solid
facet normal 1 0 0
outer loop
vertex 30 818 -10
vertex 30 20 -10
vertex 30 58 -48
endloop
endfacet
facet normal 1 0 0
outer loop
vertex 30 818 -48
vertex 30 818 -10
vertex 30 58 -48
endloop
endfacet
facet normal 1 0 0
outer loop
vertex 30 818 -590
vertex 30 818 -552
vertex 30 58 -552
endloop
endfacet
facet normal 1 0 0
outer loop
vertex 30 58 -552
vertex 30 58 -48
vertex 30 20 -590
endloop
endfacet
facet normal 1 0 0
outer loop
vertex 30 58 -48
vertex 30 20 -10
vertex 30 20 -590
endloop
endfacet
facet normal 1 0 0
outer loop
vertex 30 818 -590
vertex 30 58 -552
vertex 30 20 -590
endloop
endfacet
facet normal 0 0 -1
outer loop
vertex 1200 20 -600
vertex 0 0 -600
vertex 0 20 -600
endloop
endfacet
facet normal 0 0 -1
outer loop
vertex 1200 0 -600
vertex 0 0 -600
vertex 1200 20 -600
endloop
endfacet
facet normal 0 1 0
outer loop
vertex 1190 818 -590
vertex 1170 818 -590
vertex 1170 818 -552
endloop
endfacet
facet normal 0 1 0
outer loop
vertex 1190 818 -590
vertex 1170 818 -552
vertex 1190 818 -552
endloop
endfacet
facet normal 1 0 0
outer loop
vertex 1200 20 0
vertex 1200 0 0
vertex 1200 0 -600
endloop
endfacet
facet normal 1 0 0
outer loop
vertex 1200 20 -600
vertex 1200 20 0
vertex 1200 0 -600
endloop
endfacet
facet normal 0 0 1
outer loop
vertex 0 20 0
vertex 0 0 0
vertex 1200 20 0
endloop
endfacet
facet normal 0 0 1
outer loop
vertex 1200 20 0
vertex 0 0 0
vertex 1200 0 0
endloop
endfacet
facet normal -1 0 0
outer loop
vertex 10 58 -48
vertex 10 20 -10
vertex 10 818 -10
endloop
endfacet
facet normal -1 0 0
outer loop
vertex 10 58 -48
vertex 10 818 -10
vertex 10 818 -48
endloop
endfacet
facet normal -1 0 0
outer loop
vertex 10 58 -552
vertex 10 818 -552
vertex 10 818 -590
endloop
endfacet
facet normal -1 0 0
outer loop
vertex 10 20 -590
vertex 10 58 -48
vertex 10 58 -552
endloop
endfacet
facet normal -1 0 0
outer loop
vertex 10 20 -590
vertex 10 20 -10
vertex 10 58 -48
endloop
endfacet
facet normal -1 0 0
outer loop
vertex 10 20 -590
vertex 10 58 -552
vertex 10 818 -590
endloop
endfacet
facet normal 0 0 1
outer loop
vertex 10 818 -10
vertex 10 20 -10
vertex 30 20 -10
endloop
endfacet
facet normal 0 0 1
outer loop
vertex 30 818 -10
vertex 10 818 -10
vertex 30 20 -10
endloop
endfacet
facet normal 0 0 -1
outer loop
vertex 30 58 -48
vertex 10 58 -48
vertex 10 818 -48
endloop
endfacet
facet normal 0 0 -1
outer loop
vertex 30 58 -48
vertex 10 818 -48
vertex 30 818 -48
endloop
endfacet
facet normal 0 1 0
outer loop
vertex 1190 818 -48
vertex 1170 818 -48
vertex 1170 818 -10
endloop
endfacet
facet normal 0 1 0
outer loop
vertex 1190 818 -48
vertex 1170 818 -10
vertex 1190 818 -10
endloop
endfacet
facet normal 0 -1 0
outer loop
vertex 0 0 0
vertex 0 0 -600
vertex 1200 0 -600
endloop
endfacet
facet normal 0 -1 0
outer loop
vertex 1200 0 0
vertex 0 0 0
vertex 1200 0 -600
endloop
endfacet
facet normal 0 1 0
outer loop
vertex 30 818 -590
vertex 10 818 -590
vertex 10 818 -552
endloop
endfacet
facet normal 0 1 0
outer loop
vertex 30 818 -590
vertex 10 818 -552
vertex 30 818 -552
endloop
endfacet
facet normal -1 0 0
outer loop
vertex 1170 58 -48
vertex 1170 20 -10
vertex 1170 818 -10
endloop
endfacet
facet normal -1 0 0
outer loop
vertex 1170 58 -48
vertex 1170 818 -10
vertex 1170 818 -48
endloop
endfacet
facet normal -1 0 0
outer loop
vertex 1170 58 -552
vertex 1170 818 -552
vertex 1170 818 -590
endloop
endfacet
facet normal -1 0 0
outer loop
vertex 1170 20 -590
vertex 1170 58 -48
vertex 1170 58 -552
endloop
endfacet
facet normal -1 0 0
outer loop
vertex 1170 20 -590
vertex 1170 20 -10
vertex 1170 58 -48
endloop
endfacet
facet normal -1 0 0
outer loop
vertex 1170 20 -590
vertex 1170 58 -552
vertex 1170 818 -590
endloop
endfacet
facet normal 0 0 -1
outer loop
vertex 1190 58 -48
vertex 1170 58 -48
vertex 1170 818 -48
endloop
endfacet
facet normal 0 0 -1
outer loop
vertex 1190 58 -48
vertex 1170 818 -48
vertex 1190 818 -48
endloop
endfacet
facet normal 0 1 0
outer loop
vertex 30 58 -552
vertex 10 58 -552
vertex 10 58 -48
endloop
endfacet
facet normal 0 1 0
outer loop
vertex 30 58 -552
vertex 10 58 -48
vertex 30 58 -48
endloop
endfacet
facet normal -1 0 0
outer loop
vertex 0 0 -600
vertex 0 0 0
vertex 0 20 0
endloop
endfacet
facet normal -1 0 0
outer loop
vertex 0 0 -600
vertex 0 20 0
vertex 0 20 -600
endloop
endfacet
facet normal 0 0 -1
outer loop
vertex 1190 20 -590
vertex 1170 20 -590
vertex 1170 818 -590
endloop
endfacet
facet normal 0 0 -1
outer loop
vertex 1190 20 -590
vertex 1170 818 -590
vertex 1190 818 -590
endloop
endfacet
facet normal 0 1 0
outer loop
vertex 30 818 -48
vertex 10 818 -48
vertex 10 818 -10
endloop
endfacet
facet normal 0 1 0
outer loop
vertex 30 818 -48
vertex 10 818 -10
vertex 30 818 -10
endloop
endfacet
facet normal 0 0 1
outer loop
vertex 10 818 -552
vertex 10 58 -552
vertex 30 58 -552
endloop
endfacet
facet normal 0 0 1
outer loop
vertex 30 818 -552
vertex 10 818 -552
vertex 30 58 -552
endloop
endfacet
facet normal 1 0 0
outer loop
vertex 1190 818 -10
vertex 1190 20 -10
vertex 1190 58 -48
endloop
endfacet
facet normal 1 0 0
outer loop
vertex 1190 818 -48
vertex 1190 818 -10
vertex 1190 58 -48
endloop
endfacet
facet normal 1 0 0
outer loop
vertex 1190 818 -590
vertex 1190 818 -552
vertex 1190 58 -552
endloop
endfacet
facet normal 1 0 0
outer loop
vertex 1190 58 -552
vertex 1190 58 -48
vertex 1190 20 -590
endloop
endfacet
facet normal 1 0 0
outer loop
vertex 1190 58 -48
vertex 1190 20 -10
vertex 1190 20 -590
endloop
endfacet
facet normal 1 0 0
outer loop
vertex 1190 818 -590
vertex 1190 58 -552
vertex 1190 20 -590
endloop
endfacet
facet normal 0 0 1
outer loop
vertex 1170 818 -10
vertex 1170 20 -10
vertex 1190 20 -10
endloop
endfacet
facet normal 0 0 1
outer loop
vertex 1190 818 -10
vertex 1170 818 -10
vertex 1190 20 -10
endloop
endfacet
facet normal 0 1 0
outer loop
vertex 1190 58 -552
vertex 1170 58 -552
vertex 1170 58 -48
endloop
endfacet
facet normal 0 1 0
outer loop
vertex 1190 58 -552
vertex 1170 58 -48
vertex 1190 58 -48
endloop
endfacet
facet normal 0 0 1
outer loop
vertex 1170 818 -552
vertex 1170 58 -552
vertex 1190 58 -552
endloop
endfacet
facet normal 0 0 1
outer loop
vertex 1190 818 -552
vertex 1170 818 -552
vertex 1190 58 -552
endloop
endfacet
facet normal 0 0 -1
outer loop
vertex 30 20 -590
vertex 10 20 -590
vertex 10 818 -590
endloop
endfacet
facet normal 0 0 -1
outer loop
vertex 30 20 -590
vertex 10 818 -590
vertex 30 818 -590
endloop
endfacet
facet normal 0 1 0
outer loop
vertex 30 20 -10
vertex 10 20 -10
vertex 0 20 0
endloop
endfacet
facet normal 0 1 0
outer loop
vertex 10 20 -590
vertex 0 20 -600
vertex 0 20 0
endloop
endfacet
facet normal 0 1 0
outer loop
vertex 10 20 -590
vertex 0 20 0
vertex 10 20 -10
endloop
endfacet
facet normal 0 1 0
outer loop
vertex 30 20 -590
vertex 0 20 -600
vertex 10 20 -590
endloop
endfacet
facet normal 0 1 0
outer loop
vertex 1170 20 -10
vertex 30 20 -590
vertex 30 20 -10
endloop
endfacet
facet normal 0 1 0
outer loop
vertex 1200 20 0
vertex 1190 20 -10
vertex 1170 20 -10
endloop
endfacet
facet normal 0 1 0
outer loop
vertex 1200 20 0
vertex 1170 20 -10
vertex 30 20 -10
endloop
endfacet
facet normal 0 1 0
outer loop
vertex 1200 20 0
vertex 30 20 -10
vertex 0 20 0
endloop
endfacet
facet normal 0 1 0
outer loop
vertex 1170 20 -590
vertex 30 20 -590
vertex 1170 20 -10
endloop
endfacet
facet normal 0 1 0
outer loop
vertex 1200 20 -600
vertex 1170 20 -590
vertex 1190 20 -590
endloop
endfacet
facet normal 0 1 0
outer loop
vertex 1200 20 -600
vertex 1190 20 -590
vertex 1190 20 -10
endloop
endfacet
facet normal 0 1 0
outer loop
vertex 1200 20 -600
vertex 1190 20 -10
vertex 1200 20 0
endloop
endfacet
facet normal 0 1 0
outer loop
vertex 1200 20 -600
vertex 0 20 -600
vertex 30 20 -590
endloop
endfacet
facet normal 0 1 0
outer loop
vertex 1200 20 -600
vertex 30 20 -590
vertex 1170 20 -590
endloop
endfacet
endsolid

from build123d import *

# Parameters (mm, degrees)
SKETCH9_W           = 1200
SKETCH9_H           = 600
BOSS_EXTRUDE4_DEPTH = 20
SKETCH10_W          = 20
SKETCH10_H          = 580
BOSS_EXTRUDE6_DEPTH = 38
SKETCH11_W          = 20
SKETCH11_H          = 38
BOSS_EXTRUDE7_DEPTH = 760


with BuildPart() as part:
    # Sketch9 → Boss-Extrude4 (new body)
    with BuildSketch(Plane(origin=(0, 0, 0), x_dir=(1, 0, 0), z_dir=(0, 1, 0))):
        with Locations((600, 300)):
            Rectangle(SKETCH9_W, SKETCH9_H)
    extrude(amount=BOSS_EXTRUDE4_DEPTH)

    # Sketch10 → Boss-Extrude6 (add)
    with BuildSketch(Plane(origin=(0, 20, 0), x_dir=(1, 0, 0), z_dir=(0, 1, 0))):
        with Locations((20, 300)):
            Rectangle(SKETCH10_W, SKETCH10_H)
        with Locations((1180, 300)):
            Rectangle(SKETCH10_W, SKETCH10_H)
    extrude(amount=BOSS_EXTRUDE6_DEPTH)

    # Sketch11 → Boss-Extrude7 (add)
    with BuildSketch(Plane(origin=(0, 58, 0), x_dir=(1, 0, 0), z_dir=(0, 1, 0))):
        with Locations((20, 571)):
            Rectangle(SKETCH11_W, SKETCH11_H)
        with Locations((20, 29)):
            Rectangle(SKETCH11_W, SKETCH11_H)
        with Locations((1180, 29)):
            Rectangle(SKETCH11_W, SKETCH11_H)
        with Locations((1180, 571)):
            Rectangle(SKETCH11_W, SKETCH11_H)
    extrude(amount=BOSS_EXTRUDE7_DEPTH)


solid = part.part
